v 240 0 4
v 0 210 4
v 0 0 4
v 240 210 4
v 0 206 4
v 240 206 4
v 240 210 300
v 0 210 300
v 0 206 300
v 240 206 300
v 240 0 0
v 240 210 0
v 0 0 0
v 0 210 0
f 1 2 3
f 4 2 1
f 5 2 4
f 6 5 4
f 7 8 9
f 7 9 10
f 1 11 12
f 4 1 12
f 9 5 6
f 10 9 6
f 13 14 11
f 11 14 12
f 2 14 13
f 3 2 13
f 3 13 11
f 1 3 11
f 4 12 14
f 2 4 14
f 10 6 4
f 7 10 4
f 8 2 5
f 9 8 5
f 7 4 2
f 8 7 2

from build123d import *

# Parameters (mm, degrees)
F0_W     = 15
F0_H     = 172
F0_W_2   = 7
F0_H_2   = 15
F0_W_3   = 188
F1_DEPTH = 4
F2_START = 4
F2_DEPTH = 296


with BuildPart() as f1:
    # F0 (on Top) → F1 (new body)
    with BuildSketch(Plane.XY):
        Polygon((0, 206), (0, 4), (4, 4), (4, 19), (4, 191), (4, 206), align=None)
        Polygon((0, 210), (0, 206), (4, 206), (19, 206), (26, 206), (214, 206), (221, 206), (236, 206), (240, 206), (240, 210), align=None)
        Polygon((0, 4), (0, 0), (240, 0), (240, 4), (236, 4), (221, 4), (214, 4), (26, 4), (19, 4), (4, 4), align=None)
        with Locations((11.5, 105)):
            Rectangle(F0_W, F0_H)
        with Locations((228.5, 105)):
            Rectangle(F0_W, F0_H)
        with Locations((217.5, 11.5)):
            Rectangle(F0_W_2, F0_H_2)
        with Locations((120, 11.5)):
            Rectangle(F0_W_3, F0_H_2)
        Polygon((19, 191), (19, 19), (26, 19), (214, 19), (221, 19), (221, 191), (214, 191), (26, 191), align=None)
        Polygon((236, 4), (240, 4), (240, 206), (236, 206), (236, 191), (236, 19), align=None)
        with Locations((11.5, 11.5)):
            Rectangle(F0_W, F0_H_2)
        with Locations((22.5, 11.5)):
            Rectangle(F0_W_2, F0_H_2)
        with Locations((22.5, 198.5)):
            Rectangle(F0_W_2, F0_H_2)
        with Locations((11.5, 198.5)):
            Rectangle(F0_W, F0_H_2)
        with Locations((120, 198.5)):
            Rectangle(F0_W_3, F0_H_2)
        with Locations((228.5, 198.5)):
            Rectangle(F0_W, F0_H_2)
        with Locations((217.5, 198.5)):
            Rectangle(F0_W_2, F0_H_2)
        with Locations((228.5, 11.5)):
            Rectangle(F0_W, F0_H_2)
    extrude(amount=F1_DEPTH)


with BuildPart() as f2:
    # F0 (on Top) → F2 (new body)
    with BuildSketch(Plane.XY.offset(F2_START)):
        Polygon((0, 210), (0, 206), (4, 206), (19, 206), (26, 206), (214, 206), (221, 206), (236, 206), (240, 206), (240, 210), align=None)
    extrude(amount=F2_DEPTH)


solid = Compound([f1.part, f2.part])
